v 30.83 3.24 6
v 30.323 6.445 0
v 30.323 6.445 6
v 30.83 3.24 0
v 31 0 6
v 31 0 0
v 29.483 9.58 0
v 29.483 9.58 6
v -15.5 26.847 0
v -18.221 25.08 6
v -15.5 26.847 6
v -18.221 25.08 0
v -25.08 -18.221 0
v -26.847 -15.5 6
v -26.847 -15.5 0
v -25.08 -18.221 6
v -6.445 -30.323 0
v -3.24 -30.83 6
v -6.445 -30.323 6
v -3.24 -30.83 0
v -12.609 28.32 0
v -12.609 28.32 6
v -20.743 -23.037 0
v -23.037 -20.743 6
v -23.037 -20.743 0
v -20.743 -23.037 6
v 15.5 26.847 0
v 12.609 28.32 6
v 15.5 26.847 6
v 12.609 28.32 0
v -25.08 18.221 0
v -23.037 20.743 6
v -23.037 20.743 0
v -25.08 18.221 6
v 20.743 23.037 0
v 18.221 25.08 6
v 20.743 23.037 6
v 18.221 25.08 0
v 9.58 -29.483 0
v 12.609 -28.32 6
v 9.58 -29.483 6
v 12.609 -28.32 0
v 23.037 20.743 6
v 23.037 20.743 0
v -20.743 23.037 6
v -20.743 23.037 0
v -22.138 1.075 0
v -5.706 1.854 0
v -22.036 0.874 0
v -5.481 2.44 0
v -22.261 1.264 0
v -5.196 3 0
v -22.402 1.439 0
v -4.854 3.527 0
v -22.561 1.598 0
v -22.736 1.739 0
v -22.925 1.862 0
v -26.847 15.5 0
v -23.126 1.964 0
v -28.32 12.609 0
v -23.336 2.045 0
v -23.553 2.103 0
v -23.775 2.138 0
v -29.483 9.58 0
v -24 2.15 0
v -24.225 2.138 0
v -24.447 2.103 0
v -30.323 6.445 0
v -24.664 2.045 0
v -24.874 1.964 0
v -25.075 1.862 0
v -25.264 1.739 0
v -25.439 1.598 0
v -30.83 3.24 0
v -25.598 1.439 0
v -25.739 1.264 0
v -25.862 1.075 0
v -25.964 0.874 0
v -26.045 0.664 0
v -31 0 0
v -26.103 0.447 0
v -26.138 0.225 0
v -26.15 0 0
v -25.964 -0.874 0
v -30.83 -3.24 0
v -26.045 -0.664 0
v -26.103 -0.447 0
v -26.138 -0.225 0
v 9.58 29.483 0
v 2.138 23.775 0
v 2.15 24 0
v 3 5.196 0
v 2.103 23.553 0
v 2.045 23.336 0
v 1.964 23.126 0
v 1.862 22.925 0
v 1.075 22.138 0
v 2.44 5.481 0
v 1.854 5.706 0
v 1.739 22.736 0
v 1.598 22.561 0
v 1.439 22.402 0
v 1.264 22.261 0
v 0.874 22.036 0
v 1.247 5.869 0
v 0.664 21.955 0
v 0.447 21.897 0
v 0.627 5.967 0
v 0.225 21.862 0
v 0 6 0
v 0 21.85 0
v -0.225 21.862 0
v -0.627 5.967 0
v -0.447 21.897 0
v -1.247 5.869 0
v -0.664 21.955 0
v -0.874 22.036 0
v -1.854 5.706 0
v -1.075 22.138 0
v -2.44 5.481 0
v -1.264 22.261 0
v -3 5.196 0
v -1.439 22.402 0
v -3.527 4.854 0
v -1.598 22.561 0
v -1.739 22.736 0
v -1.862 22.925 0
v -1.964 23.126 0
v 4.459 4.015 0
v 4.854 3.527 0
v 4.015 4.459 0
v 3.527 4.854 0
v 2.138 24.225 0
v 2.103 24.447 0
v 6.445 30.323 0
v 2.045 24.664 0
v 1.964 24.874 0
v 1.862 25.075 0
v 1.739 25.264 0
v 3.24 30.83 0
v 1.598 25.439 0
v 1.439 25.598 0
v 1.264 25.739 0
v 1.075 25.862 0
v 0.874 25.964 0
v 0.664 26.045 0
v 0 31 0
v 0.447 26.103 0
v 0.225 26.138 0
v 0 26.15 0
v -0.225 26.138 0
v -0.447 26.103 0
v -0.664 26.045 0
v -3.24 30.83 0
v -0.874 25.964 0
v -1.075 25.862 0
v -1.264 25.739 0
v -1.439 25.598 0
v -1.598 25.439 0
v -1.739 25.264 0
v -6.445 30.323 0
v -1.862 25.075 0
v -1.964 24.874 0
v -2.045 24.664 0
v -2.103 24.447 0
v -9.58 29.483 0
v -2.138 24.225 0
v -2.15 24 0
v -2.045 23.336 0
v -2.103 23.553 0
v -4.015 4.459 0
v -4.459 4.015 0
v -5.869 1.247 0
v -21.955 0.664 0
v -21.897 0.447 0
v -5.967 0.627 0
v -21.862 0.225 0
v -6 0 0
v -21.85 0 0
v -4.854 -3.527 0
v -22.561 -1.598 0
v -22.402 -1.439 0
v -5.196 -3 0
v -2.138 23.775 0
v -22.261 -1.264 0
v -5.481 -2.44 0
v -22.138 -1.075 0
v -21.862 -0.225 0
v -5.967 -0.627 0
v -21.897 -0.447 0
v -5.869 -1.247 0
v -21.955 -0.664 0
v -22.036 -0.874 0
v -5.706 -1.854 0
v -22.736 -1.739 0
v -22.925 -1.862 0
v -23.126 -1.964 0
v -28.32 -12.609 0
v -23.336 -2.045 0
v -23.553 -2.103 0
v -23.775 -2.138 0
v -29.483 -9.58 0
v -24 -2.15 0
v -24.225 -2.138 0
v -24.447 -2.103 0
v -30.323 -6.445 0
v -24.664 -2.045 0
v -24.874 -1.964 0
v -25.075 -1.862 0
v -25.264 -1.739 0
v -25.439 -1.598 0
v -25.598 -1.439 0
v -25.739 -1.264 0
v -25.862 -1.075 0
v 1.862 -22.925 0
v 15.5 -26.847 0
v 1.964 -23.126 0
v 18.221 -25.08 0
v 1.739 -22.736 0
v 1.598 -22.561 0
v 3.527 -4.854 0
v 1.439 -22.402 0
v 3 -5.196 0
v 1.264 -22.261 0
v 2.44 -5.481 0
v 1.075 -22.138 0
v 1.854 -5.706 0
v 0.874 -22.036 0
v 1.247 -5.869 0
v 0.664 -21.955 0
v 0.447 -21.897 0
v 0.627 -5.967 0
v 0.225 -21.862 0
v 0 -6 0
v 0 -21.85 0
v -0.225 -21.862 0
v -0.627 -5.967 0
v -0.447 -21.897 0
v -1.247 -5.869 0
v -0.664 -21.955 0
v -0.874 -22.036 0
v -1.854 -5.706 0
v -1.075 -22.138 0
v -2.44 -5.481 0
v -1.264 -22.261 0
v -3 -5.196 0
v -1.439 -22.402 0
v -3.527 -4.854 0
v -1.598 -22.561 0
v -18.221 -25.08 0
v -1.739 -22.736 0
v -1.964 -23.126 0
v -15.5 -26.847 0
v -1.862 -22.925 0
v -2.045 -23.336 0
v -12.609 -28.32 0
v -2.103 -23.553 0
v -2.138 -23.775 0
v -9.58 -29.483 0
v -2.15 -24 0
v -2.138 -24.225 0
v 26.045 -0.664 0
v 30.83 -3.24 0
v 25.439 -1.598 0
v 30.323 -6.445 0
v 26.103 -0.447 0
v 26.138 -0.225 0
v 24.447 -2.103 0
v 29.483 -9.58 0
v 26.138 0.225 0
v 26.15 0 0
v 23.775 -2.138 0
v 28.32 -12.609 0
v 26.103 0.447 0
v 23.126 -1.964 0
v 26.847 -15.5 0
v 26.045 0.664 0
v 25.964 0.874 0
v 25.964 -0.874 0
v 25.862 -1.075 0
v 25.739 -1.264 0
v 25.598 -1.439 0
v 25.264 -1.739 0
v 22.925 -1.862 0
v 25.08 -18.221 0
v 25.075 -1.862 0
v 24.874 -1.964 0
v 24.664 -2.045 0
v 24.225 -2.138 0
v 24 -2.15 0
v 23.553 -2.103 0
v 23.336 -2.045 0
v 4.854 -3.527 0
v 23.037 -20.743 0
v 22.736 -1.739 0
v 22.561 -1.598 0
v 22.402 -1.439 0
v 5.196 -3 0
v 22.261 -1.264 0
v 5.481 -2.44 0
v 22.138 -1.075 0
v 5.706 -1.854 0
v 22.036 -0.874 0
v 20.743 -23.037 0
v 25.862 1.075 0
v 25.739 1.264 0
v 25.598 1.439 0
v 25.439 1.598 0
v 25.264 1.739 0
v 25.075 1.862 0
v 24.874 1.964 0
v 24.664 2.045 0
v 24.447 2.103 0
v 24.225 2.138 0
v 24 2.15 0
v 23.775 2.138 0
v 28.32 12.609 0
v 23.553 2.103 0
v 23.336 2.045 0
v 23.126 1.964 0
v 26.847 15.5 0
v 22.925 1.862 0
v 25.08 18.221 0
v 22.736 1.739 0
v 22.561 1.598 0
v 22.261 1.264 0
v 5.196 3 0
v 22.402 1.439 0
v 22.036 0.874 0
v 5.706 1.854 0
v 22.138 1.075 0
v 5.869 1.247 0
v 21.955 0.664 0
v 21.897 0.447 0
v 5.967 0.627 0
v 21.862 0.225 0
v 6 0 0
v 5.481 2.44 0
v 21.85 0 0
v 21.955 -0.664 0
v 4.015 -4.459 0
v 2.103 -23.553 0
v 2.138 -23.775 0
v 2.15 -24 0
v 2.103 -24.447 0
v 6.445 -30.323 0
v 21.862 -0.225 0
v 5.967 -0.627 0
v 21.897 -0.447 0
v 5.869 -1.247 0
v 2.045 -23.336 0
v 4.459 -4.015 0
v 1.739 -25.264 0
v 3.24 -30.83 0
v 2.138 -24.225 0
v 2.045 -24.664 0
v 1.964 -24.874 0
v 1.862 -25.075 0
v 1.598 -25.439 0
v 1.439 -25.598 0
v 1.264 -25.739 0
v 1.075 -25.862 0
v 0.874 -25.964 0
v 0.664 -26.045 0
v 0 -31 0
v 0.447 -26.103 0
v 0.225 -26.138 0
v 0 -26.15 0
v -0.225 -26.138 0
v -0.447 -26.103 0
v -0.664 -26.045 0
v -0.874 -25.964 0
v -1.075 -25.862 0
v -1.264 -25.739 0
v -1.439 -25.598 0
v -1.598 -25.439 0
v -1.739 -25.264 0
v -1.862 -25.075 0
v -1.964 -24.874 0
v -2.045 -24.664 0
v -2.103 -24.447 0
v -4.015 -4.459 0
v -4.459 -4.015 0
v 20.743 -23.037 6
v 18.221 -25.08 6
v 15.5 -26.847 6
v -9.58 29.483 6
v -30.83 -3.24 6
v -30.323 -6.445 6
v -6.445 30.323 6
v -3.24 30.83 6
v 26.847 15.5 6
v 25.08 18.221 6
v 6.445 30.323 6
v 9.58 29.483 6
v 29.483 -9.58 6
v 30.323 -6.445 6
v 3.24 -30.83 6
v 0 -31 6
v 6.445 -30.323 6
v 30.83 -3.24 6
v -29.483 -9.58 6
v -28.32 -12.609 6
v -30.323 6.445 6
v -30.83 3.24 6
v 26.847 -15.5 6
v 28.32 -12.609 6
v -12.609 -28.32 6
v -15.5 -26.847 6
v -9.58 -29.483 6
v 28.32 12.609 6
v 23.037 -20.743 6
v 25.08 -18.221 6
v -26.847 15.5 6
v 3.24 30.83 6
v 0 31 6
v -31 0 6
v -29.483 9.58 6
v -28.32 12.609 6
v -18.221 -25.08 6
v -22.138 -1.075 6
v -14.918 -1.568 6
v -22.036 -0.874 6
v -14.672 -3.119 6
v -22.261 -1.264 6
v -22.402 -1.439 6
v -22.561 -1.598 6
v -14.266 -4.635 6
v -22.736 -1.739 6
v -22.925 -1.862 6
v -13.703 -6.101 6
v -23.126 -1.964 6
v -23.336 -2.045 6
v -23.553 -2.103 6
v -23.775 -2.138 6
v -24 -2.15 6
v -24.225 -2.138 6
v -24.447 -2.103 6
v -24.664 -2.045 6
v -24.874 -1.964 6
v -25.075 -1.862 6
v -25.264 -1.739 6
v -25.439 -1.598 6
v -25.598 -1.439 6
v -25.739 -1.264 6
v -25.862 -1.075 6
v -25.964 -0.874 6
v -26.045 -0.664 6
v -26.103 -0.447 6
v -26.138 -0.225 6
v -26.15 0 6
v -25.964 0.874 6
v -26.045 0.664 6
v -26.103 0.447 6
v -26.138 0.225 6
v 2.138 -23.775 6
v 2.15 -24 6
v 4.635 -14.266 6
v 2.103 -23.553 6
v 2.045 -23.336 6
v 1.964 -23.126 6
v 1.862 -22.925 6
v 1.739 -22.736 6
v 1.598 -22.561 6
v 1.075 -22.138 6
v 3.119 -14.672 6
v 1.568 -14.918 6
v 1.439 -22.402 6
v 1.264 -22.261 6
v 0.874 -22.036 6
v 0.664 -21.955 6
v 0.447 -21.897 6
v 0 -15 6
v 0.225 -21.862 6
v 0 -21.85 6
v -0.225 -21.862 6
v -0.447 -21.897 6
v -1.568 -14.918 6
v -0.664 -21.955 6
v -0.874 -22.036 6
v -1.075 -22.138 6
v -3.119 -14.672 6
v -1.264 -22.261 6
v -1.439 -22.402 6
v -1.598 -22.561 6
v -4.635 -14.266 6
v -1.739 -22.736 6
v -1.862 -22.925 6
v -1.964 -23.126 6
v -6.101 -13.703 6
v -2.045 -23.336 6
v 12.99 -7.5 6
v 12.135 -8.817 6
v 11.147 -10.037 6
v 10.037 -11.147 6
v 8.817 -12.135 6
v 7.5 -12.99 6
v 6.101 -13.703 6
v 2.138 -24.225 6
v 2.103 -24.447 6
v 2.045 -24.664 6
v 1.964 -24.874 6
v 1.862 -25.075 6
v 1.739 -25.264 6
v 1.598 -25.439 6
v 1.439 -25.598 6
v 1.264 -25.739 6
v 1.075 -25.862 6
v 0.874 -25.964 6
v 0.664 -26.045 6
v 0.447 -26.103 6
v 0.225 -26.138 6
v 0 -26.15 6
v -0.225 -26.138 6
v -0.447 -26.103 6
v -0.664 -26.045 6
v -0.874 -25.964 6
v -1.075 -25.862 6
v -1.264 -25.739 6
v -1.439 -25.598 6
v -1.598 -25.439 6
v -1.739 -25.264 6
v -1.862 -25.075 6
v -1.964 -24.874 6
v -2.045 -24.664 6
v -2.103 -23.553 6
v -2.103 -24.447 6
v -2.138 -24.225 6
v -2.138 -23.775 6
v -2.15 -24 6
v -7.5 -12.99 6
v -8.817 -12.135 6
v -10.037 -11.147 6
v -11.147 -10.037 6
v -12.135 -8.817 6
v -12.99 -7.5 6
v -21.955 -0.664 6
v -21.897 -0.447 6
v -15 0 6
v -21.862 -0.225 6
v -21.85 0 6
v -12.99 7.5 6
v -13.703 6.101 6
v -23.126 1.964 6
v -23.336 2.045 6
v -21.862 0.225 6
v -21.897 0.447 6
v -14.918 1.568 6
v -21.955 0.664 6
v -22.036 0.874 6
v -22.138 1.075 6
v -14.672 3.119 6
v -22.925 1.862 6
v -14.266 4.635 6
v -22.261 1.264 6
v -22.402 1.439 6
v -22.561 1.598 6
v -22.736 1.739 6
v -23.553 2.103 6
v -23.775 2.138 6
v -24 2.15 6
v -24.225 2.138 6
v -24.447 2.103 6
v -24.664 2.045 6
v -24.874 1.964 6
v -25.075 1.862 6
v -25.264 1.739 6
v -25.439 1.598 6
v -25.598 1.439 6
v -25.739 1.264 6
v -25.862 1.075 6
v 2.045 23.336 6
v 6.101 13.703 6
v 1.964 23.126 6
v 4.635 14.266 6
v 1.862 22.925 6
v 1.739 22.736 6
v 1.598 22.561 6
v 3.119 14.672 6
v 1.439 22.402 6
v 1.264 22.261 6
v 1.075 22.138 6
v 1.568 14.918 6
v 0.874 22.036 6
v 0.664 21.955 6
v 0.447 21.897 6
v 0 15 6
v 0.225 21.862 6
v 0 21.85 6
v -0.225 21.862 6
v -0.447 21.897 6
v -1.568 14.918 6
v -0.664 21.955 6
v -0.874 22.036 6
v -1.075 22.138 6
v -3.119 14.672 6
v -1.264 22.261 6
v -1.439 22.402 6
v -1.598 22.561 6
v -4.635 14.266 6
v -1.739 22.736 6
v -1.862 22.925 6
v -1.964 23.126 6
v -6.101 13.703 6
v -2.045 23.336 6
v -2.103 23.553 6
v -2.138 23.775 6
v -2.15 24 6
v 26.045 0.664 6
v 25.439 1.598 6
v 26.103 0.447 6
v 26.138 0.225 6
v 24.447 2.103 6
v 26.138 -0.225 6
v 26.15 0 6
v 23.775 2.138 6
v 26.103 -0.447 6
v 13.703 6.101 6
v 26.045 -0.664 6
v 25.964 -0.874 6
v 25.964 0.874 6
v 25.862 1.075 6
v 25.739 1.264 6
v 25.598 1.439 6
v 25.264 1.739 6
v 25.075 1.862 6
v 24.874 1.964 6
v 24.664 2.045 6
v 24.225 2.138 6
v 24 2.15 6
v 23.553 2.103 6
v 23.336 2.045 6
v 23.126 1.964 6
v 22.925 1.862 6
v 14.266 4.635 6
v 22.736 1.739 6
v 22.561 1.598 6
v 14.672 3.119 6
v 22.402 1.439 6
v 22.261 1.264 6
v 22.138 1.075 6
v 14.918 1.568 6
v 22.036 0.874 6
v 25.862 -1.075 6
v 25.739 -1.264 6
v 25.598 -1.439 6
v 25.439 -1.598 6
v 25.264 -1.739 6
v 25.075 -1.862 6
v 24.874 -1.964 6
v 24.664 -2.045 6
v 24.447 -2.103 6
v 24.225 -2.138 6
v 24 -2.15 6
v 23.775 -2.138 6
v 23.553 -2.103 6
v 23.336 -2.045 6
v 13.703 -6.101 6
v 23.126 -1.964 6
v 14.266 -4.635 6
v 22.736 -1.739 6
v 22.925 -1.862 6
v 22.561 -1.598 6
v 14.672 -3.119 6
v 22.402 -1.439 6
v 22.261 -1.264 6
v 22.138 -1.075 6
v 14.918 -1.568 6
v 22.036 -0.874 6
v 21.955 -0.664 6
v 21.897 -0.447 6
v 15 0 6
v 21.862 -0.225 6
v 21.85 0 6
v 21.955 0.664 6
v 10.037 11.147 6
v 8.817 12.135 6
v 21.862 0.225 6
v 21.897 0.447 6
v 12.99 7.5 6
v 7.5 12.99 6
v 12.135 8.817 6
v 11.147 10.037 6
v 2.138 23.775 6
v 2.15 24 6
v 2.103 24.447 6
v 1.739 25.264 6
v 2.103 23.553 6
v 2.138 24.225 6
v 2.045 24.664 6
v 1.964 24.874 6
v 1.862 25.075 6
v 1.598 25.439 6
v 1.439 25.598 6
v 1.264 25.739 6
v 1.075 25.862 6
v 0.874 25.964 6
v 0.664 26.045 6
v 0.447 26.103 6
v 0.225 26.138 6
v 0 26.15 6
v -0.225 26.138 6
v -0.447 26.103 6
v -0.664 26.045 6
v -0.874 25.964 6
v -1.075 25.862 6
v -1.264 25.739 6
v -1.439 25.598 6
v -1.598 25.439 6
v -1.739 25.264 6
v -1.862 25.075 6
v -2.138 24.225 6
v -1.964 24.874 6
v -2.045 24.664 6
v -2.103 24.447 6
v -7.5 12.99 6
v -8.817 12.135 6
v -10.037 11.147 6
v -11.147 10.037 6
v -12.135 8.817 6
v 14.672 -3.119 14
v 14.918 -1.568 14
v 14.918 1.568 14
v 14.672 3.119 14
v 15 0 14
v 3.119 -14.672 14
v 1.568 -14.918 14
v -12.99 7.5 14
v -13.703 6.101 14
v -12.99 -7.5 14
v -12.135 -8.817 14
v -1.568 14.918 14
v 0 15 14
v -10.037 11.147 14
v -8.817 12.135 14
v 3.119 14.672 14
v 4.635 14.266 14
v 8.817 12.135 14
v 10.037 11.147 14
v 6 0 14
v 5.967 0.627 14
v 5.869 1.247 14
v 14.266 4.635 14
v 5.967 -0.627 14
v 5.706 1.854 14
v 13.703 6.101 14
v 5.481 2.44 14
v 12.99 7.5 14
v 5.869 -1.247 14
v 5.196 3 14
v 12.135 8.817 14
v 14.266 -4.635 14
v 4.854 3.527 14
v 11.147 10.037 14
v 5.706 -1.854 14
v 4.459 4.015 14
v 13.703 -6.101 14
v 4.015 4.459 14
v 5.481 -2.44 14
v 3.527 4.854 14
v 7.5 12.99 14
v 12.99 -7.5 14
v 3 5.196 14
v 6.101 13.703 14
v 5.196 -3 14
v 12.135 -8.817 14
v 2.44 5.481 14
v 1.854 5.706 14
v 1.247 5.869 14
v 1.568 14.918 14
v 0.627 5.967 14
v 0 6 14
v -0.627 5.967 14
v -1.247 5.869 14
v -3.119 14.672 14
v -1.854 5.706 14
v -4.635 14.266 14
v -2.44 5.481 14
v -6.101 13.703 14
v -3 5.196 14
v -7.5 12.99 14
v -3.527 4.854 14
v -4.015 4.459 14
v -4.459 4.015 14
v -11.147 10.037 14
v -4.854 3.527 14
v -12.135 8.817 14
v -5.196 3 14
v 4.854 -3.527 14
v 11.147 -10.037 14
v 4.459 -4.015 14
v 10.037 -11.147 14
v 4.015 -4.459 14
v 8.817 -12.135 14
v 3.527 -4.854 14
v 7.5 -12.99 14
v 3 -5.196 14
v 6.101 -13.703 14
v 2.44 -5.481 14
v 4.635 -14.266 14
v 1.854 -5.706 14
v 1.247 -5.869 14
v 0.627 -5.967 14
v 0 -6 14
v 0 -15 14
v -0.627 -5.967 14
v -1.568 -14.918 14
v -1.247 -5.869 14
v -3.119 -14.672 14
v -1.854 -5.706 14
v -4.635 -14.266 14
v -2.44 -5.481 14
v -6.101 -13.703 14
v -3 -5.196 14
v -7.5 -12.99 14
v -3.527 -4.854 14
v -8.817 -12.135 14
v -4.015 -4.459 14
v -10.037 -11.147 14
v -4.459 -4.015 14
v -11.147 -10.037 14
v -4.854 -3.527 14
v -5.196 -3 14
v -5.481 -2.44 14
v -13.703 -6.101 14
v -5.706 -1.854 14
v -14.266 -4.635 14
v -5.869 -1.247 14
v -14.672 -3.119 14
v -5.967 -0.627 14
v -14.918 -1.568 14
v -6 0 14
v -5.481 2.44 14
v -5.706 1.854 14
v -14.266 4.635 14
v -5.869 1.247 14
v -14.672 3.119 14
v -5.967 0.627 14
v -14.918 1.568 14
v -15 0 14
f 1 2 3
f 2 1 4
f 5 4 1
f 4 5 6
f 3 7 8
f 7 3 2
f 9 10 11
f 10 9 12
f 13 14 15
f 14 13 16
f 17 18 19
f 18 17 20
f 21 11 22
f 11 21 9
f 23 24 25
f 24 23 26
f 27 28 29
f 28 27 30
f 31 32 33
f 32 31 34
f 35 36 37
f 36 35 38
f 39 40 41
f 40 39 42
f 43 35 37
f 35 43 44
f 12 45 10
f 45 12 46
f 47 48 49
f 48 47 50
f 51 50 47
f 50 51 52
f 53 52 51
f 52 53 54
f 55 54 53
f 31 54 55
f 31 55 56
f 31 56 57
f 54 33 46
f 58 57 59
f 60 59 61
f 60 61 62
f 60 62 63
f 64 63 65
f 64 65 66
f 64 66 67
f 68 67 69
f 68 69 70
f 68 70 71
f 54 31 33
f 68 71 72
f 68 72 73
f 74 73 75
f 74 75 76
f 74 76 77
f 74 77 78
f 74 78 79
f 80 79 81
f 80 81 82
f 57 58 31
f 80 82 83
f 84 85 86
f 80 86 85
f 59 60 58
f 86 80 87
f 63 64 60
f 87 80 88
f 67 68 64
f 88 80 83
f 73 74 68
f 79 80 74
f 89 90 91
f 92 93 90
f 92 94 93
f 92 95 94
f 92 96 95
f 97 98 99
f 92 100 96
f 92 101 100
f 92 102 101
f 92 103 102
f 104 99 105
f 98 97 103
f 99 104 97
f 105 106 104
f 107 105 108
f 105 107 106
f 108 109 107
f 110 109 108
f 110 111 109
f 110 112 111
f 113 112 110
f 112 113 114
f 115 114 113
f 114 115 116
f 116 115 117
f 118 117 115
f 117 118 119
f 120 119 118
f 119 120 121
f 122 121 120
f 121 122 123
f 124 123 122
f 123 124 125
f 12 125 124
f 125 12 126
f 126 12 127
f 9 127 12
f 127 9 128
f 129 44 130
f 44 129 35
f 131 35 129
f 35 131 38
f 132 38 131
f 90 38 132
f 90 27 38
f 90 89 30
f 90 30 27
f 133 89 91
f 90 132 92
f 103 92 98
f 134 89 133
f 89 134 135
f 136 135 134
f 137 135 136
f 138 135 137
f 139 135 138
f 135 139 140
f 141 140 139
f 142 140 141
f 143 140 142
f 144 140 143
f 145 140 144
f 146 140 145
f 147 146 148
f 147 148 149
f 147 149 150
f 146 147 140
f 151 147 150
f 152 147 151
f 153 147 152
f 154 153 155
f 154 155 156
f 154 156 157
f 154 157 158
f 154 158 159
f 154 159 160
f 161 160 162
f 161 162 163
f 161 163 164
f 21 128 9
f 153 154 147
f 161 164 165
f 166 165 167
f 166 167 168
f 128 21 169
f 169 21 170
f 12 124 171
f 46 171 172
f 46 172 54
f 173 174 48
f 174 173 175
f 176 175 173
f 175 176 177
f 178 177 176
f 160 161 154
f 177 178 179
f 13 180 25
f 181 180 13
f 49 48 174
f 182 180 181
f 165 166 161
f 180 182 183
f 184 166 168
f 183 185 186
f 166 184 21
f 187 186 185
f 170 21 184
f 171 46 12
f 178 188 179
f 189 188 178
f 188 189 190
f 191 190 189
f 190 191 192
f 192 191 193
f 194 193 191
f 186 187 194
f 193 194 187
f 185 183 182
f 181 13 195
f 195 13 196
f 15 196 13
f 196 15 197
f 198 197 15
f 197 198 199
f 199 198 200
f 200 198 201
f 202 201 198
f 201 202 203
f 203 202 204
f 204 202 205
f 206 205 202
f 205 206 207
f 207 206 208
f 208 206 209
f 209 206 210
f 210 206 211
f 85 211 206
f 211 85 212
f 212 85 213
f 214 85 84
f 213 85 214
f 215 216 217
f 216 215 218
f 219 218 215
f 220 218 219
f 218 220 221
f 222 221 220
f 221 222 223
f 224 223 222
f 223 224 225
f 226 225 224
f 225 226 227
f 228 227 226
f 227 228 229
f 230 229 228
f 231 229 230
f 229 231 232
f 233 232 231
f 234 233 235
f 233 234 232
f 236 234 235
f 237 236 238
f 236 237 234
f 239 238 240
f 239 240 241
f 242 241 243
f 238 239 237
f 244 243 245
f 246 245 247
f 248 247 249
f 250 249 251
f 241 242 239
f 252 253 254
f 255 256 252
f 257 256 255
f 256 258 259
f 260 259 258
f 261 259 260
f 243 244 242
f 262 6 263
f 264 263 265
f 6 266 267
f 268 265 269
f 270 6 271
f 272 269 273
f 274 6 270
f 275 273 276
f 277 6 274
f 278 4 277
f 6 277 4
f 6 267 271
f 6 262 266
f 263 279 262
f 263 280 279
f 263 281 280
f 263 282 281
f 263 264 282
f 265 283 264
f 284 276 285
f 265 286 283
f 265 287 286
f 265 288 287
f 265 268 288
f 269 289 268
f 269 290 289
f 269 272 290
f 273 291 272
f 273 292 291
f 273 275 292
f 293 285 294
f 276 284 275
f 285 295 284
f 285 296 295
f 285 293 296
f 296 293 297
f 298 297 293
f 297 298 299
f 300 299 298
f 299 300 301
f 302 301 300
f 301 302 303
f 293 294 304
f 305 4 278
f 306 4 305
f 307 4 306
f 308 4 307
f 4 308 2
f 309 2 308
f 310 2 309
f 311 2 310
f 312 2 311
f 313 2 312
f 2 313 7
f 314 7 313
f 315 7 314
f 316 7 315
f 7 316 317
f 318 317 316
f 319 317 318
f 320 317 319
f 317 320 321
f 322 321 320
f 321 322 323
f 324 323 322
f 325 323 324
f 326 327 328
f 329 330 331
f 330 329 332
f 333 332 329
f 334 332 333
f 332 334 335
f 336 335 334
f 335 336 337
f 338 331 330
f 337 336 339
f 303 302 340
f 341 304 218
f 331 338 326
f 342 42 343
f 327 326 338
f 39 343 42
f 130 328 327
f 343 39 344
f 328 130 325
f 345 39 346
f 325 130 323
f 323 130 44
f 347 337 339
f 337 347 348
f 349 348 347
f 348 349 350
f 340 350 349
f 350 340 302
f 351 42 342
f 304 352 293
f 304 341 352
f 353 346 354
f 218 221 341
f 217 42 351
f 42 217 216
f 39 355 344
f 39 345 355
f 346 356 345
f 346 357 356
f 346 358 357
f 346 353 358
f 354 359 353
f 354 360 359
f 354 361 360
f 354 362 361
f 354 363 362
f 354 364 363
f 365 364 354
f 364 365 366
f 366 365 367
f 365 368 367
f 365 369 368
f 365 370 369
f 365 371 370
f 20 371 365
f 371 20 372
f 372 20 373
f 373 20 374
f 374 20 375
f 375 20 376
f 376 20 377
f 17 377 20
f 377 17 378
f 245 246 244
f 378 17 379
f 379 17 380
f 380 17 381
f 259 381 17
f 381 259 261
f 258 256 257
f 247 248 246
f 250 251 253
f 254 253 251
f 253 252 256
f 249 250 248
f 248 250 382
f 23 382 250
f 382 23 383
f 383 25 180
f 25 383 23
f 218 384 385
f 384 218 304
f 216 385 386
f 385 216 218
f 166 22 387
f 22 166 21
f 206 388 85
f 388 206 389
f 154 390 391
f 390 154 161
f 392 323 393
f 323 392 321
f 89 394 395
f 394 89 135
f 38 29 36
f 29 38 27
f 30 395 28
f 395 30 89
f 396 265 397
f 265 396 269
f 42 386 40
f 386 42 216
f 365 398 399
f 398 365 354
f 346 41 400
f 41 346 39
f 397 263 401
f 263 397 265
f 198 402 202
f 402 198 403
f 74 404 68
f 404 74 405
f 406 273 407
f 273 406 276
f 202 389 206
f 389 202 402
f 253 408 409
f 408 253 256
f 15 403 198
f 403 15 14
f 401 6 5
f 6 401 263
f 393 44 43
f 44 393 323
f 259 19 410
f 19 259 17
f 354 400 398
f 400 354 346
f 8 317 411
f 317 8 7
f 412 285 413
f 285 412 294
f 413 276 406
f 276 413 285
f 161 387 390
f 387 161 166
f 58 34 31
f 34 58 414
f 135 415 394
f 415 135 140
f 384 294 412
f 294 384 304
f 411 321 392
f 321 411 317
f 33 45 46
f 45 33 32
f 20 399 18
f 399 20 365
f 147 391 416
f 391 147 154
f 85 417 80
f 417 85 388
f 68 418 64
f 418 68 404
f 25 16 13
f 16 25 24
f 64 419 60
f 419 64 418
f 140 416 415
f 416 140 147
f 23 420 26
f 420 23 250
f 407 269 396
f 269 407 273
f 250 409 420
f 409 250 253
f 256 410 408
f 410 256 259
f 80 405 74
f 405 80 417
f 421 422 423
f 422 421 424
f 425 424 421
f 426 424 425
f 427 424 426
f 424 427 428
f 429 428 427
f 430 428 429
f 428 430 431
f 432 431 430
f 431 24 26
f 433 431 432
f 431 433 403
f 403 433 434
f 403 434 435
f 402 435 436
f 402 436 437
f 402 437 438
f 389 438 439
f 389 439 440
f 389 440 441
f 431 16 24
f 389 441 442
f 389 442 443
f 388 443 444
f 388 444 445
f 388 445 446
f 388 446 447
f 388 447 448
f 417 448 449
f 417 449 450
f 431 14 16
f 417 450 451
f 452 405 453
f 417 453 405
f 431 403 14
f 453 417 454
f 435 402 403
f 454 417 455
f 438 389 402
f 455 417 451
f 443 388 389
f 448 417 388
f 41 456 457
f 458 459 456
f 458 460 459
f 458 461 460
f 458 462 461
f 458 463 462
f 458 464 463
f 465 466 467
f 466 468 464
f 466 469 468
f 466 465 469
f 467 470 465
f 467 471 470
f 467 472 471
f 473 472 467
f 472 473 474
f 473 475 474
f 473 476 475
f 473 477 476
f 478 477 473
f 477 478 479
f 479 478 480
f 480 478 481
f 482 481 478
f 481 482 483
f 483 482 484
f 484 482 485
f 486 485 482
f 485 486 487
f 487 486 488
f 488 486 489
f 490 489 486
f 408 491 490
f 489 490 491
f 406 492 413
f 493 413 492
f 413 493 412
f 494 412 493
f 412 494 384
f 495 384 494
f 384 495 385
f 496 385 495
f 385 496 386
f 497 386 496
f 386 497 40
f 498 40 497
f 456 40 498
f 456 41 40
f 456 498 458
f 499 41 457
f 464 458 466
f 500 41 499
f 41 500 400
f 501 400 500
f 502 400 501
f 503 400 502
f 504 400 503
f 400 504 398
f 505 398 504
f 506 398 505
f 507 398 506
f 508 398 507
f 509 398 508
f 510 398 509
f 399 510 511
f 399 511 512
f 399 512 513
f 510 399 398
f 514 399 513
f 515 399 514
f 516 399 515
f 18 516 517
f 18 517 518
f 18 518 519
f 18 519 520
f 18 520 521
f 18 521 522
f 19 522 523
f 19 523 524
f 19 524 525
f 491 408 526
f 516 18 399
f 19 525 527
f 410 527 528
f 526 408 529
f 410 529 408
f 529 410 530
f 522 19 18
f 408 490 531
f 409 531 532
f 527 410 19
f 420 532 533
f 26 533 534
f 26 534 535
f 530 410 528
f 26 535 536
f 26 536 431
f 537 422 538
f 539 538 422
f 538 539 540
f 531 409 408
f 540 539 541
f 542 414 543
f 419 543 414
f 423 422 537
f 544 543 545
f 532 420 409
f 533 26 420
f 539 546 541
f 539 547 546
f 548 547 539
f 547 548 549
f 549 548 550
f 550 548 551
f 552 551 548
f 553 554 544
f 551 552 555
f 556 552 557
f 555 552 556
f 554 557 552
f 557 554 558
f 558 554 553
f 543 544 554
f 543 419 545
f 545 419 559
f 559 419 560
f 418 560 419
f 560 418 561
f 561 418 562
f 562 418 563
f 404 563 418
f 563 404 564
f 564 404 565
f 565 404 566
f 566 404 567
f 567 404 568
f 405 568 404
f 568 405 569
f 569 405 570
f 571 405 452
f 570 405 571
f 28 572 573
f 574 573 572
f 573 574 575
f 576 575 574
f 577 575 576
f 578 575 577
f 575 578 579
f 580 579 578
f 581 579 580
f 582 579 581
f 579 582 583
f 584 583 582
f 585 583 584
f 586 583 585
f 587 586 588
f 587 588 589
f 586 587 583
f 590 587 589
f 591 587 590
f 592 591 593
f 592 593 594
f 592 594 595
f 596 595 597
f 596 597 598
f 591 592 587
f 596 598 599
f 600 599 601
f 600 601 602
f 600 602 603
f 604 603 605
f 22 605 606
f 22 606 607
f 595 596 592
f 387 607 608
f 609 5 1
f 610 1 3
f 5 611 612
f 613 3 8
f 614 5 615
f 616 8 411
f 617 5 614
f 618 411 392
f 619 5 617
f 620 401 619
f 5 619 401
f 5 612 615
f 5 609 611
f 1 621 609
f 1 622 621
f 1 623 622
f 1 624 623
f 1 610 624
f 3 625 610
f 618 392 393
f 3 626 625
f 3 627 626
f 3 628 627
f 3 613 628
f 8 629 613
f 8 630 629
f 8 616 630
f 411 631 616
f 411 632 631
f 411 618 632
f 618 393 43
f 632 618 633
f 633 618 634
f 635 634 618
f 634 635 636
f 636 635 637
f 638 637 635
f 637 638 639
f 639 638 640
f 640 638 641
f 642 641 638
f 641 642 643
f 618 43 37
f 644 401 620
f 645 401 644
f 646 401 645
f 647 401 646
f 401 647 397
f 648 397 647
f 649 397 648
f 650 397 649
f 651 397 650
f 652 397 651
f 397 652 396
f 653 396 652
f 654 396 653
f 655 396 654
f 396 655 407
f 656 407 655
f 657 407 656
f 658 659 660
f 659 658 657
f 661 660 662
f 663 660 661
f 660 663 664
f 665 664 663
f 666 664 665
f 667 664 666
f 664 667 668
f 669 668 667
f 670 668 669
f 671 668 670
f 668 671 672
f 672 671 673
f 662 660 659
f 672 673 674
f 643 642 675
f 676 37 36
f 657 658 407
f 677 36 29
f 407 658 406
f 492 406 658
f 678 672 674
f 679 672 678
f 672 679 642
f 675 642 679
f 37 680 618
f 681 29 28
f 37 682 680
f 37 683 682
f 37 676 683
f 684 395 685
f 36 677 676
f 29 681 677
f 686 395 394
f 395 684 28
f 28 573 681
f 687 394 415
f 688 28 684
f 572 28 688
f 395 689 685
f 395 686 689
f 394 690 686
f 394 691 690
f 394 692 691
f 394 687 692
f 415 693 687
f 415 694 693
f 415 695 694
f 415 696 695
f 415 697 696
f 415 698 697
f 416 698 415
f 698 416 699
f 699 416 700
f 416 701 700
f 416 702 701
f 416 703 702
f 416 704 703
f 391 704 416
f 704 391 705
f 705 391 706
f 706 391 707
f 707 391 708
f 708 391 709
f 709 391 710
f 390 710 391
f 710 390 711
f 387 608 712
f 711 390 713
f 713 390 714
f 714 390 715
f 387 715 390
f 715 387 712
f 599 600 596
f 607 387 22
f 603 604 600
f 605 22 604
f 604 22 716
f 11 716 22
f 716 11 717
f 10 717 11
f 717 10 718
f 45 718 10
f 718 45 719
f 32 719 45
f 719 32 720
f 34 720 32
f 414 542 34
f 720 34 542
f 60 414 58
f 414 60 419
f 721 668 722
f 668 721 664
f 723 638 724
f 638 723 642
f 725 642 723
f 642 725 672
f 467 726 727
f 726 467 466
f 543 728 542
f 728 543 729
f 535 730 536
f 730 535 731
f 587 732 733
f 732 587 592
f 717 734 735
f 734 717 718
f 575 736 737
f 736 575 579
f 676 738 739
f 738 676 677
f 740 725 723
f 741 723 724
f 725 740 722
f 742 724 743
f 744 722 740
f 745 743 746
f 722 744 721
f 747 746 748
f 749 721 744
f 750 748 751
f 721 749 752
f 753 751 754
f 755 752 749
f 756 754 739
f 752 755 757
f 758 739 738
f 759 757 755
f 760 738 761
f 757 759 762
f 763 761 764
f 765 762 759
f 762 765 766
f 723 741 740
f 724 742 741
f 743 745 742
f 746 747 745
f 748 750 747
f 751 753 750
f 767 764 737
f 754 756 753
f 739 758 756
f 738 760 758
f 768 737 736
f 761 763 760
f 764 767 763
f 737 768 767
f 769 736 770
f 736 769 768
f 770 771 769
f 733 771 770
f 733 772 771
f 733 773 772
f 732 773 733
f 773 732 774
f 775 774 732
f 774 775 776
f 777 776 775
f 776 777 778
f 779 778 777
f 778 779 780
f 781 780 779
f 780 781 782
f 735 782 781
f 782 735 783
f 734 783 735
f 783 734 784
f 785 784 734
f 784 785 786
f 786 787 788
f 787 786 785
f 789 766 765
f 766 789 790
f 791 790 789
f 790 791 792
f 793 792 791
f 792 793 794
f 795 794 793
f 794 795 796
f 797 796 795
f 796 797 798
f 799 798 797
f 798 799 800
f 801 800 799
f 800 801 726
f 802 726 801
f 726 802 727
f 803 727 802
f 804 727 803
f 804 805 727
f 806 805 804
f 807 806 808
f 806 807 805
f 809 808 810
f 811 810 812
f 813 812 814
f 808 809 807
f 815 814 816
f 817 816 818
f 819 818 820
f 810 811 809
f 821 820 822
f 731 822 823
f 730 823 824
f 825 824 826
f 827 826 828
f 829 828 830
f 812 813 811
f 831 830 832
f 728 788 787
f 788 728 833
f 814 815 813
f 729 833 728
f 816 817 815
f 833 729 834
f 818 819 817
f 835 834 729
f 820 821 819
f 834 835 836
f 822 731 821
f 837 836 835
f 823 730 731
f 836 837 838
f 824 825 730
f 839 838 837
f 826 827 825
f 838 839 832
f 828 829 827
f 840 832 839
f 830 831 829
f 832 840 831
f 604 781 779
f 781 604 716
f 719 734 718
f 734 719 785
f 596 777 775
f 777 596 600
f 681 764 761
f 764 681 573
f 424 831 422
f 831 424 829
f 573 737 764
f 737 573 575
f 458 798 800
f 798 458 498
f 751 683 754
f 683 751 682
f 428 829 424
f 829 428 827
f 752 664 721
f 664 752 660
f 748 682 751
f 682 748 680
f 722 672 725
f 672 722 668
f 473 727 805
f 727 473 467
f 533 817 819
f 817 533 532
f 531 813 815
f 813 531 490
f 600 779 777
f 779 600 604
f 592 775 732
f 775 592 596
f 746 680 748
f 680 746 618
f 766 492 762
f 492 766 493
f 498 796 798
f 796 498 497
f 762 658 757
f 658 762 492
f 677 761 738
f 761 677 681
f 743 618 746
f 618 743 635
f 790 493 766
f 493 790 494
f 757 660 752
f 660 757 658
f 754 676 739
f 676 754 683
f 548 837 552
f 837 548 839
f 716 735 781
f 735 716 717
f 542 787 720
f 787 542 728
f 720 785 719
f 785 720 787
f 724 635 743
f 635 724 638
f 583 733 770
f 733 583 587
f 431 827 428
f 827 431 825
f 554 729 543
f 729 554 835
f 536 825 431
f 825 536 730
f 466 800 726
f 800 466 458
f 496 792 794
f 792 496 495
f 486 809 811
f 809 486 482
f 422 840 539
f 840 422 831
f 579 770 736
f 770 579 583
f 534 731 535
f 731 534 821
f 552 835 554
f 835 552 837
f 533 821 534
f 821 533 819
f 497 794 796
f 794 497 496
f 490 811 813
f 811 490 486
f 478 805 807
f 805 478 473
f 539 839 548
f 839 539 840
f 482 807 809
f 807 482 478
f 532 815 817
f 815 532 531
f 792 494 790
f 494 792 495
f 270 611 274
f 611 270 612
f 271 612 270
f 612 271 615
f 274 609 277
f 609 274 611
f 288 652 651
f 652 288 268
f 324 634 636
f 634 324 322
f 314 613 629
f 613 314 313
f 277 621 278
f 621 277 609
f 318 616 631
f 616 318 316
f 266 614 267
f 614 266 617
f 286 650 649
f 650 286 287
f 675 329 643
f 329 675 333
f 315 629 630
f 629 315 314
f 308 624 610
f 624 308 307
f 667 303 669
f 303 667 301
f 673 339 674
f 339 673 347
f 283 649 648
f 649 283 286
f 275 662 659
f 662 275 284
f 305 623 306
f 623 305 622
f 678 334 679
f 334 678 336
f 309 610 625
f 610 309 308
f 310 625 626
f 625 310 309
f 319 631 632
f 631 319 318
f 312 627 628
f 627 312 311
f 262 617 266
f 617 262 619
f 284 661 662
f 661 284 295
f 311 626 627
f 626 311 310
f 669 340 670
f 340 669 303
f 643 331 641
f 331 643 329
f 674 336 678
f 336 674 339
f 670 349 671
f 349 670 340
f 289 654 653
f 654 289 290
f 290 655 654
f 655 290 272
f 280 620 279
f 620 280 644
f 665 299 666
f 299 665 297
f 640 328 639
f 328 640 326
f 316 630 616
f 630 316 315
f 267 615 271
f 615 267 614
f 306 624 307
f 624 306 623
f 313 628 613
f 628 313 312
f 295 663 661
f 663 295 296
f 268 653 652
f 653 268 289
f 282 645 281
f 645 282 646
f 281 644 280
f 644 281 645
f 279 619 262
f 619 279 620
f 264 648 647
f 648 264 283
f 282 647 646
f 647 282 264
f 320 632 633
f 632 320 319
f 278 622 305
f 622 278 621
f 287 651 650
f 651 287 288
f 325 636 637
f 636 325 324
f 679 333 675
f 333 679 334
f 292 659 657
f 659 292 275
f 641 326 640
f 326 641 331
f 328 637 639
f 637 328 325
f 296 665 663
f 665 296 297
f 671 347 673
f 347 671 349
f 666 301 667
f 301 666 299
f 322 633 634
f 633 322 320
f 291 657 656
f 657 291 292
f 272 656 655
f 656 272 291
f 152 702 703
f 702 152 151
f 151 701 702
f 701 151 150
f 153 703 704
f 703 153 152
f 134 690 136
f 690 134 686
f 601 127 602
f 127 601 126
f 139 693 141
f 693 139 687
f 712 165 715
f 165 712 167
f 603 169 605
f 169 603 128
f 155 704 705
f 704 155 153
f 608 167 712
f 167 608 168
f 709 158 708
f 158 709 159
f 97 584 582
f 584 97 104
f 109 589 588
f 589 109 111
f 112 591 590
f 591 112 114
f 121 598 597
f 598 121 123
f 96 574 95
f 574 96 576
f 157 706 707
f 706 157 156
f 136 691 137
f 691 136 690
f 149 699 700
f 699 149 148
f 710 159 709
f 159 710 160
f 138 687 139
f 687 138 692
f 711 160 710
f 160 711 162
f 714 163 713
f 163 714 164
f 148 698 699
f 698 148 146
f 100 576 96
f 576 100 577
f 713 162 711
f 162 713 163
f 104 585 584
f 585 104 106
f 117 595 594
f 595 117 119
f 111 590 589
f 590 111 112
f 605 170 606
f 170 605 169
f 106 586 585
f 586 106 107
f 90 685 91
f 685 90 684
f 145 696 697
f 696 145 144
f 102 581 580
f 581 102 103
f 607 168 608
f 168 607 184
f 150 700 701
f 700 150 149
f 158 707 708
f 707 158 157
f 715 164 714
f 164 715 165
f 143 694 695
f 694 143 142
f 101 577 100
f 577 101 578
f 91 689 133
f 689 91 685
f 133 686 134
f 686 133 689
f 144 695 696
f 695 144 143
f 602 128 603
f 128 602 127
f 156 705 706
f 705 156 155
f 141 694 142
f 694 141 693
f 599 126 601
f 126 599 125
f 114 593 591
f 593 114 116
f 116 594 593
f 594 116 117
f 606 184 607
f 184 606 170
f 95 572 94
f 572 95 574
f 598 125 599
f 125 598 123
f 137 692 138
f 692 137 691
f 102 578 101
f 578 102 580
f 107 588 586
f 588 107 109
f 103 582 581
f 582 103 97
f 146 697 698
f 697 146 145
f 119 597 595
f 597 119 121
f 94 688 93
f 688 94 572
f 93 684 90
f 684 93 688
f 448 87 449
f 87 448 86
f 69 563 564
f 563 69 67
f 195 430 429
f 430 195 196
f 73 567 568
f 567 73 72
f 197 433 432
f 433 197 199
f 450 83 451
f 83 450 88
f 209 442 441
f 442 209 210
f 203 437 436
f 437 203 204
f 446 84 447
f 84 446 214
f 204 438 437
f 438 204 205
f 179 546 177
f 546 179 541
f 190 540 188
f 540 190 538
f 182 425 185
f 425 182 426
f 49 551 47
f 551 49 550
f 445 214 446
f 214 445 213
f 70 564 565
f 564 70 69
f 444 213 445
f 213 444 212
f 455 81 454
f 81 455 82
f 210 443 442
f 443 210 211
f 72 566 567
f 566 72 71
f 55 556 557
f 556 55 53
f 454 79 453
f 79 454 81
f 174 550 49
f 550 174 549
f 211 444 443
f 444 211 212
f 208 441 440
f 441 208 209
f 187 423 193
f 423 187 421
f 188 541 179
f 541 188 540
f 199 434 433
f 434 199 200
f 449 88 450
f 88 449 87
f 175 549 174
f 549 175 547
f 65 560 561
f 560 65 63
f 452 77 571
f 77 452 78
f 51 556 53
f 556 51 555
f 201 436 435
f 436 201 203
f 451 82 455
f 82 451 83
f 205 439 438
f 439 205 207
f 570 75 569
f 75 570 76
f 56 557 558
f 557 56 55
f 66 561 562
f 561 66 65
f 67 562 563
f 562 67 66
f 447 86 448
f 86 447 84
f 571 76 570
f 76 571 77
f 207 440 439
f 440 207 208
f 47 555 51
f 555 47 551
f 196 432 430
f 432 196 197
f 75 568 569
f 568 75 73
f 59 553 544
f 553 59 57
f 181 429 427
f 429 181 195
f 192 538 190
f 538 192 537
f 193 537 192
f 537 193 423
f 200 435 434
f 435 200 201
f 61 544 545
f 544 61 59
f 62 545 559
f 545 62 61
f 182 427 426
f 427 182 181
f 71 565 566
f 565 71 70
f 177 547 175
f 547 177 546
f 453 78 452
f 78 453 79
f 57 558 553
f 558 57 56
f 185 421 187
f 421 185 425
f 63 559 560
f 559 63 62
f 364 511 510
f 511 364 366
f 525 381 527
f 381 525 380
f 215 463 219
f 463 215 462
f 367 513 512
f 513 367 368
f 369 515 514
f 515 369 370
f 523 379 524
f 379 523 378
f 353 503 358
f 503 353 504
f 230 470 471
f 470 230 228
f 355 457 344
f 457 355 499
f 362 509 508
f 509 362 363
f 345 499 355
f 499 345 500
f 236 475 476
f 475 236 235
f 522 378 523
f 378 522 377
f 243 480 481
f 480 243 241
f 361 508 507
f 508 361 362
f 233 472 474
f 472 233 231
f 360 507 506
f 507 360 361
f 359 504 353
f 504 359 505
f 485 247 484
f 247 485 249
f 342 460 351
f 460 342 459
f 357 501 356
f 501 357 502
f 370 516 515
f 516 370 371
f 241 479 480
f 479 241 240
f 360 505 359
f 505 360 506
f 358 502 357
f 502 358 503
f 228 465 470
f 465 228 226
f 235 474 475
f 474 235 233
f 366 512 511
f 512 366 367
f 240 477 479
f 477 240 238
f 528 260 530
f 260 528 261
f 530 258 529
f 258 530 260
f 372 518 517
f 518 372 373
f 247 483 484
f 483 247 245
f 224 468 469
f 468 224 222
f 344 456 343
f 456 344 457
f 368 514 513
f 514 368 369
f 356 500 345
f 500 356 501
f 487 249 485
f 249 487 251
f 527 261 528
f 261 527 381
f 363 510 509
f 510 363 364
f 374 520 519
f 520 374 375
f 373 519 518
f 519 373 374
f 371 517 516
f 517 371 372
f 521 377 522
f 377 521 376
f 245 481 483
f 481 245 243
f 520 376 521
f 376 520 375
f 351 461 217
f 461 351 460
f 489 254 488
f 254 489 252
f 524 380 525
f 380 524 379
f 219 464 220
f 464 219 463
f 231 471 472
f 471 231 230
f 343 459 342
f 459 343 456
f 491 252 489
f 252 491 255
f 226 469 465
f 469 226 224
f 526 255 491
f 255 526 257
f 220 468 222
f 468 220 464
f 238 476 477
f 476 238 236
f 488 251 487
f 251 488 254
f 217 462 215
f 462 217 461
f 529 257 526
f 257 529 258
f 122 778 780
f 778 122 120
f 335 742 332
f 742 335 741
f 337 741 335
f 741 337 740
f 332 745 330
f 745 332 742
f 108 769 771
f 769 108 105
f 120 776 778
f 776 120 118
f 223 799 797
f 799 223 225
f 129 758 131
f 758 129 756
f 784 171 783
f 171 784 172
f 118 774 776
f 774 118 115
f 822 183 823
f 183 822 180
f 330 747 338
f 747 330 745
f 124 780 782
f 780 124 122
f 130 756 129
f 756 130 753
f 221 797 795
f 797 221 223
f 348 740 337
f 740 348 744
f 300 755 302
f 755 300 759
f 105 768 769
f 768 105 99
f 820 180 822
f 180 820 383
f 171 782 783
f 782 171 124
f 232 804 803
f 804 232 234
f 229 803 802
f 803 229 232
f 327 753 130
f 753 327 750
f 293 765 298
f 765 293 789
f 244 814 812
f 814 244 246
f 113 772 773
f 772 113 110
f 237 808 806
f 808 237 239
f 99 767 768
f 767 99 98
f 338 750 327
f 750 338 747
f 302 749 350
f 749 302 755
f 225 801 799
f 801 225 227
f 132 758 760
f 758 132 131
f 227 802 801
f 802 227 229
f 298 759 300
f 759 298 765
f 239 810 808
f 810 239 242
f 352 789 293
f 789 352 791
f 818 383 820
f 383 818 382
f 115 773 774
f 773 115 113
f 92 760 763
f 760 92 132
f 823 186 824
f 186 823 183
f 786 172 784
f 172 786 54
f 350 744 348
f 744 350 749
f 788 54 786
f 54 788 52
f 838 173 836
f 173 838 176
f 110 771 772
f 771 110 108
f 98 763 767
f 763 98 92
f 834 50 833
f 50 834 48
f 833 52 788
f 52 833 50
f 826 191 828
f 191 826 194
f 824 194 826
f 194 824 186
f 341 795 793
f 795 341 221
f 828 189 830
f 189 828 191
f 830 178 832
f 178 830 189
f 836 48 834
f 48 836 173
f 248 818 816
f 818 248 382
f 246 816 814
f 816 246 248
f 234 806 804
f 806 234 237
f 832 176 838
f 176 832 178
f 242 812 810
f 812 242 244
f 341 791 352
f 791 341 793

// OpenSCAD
// 4-bolt mounting flange, 62 mm OD.
$fn = 60;
eps = 0.02;
flange_d = 62;
flange_t = 6;
hub_d = 30;
hub_h = 14;
center_d = 12;
bolt_circle_d = 48;
bolt_d = 4.3;
difference() {
    union() { cylinder(d = flange_d, h = flange_t); cylinder(d = hub_d, h = hub_h); }
    translate([0, 0, -eps]) cylinder(d = center_d, h = hub_h + 2 * eps);
    for (i = [0 : 3]) rotate([0, 0, i * 360 / 4])
        translate([bolt_circle_d / 2, 0, -eps]) cylinder(d = bolt_d, h = flange_t + 2 * eps);
}
